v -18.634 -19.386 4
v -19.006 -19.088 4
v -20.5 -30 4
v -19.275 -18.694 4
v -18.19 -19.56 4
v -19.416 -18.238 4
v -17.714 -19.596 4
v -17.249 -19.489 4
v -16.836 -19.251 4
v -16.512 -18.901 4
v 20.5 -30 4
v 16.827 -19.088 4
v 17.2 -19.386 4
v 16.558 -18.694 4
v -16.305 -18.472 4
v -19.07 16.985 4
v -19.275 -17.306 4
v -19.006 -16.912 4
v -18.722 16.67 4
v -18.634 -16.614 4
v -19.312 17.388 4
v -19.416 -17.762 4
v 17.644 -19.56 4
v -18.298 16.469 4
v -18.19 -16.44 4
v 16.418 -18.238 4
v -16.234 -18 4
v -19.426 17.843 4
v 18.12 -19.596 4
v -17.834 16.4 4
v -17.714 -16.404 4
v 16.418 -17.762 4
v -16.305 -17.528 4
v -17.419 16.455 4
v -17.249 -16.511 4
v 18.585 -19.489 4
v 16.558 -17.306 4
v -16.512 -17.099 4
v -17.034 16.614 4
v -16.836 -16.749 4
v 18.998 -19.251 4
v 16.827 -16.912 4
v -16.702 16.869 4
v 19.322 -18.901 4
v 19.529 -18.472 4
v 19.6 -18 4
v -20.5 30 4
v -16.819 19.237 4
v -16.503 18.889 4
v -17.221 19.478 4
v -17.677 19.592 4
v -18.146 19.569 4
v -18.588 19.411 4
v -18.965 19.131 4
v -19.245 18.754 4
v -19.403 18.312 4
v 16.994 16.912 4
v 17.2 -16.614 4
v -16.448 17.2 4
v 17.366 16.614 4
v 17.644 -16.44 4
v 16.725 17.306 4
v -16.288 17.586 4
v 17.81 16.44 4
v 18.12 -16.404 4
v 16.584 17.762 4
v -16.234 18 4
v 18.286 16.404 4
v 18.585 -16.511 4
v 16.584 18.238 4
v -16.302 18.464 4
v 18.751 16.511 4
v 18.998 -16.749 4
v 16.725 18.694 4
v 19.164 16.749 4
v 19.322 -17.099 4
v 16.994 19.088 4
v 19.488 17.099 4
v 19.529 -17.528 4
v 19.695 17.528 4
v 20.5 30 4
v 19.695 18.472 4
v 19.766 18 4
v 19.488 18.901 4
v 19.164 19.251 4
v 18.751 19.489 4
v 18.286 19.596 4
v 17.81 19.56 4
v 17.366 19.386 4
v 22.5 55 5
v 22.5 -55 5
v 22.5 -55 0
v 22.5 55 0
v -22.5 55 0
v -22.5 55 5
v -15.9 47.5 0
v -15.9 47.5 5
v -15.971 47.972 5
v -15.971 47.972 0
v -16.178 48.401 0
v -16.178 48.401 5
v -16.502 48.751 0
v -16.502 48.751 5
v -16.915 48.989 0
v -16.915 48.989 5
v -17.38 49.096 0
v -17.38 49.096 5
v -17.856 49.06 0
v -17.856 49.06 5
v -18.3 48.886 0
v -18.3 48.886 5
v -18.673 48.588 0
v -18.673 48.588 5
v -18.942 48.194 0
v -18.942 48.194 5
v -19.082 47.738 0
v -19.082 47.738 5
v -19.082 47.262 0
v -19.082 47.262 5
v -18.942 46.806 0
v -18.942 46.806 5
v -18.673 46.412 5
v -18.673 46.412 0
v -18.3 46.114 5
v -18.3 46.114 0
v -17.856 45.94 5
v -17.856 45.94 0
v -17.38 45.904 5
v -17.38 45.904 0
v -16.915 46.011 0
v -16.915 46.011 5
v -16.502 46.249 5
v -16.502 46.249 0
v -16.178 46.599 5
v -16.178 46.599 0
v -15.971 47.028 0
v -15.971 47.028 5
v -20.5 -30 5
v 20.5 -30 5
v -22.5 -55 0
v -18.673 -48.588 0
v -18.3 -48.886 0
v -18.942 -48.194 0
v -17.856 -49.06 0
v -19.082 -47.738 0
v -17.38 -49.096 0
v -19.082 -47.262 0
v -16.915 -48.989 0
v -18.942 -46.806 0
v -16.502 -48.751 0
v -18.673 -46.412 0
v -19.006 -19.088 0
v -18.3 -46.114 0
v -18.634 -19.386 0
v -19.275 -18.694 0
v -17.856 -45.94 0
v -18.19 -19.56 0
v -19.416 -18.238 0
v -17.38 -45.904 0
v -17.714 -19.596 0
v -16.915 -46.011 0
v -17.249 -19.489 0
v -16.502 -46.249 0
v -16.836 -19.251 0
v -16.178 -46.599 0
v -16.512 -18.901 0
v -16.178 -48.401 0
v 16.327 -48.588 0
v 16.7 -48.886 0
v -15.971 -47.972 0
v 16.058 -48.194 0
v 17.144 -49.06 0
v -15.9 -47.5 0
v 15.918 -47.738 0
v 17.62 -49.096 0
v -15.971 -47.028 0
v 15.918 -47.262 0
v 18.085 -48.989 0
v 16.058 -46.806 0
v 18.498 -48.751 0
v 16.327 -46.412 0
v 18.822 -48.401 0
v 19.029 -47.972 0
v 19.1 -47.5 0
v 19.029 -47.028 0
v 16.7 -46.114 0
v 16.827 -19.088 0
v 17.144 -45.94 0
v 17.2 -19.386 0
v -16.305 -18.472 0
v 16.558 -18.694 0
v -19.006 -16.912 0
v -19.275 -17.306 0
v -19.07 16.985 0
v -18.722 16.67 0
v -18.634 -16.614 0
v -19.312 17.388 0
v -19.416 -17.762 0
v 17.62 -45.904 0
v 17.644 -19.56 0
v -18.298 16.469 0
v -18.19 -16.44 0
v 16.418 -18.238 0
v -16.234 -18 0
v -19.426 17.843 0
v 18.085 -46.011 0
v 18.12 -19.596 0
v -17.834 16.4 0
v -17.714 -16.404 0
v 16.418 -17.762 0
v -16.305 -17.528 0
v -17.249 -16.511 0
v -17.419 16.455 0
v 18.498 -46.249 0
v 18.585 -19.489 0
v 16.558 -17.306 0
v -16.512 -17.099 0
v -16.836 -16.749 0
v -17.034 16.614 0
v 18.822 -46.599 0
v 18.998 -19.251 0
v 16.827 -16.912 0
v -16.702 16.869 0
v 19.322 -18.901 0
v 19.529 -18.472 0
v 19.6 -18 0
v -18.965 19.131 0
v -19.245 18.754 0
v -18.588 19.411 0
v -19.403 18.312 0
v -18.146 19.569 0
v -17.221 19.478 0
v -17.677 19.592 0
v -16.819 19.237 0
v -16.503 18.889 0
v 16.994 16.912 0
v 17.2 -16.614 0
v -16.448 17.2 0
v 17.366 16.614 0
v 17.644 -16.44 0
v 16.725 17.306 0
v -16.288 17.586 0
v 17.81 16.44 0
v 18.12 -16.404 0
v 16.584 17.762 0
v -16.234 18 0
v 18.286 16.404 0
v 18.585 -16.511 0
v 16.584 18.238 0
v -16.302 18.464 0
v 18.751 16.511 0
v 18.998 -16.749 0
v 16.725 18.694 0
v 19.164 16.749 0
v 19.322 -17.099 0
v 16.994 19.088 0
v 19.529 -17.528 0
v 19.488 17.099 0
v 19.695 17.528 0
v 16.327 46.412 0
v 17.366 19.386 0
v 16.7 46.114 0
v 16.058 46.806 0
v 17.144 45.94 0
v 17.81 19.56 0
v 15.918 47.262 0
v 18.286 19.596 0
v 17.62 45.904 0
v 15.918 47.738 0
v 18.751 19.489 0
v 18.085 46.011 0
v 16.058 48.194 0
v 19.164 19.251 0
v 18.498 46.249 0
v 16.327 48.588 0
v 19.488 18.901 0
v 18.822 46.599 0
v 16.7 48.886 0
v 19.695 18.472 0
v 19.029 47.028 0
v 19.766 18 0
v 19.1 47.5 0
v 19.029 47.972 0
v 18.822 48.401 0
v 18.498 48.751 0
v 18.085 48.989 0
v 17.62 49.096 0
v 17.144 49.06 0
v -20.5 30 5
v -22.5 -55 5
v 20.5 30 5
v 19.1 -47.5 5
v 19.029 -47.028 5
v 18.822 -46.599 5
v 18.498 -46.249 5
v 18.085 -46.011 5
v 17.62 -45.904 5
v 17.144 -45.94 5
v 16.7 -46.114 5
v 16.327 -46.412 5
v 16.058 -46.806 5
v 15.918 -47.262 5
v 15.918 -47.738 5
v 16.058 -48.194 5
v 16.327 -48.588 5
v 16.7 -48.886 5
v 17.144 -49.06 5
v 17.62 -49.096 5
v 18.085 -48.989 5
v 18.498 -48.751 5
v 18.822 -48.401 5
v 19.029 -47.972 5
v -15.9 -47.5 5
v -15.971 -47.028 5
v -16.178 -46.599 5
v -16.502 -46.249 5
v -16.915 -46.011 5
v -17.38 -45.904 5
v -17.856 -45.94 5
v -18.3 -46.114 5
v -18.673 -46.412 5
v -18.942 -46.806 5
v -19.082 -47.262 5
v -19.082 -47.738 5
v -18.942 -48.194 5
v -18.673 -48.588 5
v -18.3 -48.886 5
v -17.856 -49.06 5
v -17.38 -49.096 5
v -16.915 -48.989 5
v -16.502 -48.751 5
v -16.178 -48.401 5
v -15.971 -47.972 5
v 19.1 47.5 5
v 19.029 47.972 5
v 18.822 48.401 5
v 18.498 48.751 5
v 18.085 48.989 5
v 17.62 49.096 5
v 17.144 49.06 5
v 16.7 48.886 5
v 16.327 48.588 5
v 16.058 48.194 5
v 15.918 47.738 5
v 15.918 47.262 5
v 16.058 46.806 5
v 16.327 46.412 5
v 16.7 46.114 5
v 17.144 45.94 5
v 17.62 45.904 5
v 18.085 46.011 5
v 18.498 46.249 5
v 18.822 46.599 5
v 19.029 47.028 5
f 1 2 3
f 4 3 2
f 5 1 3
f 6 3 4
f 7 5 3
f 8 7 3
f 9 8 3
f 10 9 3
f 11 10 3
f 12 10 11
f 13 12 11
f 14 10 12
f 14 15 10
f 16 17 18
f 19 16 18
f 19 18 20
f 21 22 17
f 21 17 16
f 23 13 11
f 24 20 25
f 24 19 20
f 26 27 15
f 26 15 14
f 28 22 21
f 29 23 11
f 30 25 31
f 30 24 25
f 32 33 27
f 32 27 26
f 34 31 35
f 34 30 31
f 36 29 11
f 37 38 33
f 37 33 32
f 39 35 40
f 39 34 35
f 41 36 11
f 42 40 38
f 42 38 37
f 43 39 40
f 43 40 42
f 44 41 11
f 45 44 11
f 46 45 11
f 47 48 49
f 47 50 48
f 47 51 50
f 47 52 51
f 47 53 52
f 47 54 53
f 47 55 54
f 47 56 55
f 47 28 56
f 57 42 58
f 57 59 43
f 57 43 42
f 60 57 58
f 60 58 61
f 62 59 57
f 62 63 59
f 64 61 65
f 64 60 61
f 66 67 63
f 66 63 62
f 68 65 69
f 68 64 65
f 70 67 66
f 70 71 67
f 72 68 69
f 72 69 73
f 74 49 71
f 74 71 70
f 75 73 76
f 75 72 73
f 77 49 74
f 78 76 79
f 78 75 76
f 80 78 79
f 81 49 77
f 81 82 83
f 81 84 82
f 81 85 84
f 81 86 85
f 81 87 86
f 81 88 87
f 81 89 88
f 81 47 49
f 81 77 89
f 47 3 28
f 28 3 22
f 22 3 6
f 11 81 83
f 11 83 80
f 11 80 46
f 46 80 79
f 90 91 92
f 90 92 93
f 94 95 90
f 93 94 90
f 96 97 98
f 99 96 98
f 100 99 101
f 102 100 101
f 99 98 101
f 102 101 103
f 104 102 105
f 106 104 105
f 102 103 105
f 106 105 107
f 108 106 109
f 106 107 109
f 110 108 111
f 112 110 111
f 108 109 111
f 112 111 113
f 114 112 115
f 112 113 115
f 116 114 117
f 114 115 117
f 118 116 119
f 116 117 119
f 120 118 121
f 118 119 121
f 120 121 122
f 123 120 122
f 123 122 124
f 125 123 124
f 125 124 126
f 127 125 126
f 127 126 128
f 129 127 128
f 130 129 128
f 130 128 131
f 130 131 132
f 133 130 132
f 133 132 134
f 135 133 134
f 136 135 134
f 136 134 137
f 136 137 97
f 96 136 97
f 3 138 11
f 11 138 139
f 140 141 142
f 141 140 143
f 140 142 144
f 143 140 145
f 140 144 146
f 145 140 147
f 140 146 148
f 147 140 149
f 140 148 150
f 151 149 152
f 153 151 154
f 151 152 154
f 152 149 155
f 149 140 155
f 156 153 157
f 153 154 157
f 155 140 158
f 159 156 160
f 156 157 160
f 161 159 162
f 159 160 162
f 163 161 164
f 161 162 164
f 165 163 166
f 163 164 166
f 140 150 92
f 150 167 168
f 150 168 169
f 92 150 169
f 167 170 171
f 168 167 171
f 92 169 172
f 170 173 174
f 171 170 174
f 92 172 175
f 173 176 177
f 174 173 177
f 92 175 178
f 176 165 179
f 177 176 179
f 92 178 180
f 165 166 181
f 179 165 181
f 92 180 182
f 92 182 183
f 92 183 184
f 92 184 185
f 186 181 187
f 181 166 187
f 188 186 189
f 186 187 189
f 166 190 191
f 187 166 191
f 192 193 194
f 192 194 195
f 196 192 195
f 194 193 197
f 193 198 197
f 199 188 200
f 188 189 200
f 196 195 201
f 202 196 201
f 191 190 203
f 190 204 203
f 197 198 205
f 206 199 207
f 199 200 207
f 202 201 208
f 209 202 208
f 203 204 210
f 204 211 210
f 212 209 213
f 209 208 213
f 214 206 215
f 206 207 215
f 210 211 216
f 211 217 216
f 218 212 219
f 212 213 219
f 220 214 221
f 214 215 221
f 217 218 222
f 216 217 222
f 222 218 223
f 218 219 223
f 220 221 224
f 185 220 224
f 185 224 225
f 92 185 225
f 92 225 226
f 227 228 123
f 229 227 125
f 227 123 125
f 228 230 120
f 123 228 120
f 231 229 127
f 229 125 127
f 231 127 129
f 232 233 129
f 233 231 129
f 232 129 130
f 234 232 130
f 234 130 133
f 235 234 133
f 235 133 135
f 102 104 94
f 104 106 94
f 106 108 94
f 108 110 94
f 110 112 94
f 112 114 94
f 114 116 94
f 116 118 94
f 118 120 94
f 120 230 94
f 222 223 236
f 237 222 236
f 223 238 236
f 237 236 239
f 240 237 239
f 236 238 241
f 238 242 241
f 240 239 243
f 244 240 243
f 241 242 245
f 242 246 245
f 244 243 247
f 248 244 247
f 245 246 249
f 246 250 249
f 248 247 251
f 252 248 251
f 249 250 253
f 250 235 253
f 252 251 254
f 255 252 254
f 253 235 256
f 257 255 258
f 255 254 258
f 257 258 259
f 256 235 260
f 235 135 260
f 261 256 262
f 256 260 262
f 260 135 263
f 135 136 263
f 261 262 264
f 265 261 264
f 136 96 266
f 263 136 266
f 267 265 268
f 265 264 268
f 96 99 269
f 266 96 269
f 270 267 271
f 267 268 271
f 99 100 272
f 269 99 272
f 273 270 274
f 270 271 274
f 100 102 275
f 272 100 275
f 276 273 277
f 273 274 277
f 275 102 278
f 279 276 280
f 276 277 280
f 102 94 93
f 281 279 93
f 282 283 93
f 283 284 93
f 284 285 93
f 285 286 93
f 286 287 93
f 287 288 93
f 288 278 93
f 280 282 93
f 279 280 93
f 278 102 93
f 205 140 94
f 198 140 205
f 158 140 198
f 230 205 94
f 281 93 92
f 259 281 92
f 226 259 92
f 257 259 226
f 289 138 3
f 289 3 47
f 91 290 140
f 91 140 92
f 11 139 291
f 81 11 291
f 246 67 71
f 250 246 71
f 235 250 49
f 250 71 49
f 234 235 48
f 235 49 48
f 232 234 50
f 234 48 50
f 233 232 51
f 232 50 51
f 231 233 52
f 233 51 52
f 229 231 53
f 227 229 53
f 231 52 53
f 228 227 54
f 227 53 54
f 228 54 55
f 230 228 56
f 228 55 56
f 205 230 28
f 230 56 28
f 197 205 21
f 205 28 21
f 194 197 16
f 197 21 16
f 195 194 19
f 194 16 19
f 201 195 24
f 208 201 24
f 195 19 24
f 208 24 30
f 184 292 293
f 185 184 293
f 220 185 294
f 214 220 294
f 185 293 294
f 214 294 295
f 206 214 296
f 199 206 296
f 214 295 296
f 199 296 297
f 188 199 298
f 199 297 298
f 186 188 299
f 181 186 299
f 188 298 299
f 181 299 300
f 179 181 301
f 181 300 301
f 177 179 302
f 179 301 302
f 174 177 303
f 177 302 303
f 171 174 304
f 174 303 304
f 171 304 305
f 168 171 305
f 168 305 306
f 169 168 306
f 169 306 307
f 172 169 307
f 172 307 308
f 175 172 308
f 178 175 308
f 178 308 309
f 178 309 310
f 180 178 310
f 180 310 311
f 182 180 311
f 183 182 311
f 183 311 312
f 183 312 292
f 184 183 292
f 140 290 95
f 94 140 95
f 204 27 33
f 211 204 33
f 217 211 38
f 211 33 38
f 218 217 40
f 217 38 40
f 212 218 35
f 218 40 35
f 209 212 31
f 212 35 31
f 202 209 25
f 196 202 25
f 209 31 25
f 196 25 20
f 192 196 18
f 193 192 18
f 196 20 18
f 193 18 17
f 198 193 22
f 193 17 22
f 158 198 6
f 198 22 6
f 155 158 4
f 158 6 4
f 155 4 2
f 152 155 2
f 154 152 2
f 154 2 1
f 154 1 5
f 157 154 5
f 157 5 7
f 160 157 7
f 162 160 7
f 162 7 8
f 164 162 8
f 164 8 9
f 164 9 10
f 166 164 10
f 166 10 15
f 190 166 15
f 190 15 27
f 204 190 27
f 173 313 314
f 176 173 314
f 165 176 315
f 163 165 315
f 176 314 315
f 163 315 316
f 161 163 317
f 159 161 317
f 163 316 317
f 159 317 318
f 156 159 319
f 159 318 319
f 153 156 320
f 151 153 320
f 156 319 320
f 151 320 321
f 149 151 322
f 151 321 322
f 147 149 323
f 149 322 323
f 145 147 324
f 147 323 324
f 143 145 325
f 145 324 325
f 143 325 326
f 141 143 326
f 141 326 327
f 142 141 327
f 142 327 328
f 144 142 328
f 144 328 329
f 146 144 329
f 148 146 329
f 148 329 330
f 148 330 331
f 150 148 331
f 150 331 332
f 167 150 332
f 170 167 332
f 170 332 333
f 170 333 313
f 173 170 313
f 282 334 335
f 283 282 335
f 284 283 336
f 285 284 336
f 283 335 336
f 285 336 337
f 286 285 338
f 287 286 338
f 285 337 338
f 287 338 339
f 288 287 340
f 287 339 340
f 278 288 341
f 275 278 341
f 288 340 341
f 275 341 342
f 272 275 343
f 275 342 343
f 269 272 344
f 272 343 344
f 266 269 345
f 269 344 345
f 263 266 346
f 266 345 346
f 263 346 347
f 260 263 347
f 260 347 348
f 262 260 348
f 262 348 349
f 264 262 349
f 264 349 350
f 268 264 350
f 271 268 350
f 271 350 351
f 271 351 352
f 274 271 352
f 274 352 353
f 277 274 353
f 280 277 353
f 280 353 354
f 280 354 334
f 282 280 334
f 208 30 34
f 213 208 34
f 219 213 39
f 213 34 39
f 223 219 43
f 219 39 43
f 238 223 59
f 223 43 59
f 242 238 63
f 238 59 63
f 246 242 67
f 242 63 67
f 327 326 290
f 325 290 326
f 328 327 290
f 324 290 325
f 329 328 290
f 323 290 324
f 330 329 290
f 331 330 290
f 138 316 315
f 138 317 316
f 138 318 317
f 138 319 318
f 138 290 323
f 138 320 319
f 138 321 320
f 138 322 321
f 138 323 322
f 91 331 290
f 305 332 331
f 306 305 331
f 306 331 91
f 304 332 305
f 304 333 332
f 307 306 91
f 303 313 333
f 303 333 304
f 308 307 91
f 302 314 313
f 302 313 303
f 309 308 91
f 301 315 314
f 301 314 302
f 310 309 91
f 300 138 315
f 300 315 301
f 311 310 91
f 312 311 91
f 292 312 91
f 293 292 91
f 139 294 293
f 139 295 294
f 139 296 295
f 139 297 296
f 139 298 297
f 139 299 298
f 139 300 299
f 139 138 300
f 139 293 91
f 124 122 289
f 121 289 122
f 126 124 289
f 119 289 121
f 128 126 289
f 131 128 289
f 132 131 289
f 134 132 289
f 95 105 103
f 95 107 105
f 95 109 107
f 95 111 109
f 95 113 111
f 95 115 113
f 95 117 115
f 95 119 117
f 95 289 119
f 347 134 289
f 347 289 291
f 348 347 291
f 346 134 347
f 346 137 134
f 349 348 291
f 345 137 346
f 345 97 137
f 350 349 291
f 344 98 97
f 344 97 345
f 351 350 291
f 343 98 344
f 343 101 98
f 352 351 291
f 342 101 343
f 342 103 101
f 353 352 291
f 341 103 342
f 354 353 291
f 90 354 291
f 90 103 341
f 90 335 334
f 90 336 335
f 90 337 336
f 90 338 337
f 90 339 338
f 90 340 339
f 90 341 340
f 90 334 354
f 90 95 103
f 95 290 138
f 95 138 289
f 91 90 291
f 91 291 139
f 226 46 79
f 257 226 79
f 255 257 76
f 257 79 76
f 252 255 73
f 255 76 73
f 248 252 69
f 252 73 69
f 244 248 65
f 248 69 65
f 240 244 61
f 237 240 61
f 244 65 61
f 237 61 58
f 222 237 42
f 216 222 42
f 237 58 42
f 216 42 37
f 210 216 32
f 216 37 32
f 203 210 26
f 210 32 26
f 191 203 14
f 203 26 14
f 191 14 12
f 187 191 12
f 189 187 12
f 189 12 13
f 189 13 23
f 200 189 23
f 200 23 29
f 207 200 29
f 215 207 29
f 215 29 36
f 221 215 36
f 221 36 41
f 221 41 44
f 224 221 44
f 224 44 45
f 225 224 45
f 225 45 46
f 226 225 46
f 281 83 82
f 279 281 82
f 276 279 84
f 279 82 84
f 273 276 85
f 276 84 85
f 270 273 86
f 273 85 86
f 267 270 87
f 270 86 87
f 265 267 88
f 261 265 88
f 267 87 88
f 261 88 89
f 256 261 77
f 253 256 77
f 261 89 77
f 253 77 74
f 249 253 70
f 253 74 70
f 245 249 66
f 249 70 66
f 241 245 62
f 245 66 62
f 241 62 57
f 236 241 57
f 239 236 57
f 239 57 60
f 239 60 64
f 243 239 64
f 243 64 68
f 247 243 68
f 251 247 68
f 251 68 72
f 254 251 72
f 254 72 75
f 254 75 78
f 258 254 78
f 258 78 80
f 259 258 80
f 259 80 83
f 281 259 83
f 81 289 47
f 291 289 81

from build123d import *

# Parameters (mm, degrees)
SKETCH_1_W          = 45
SKETCH_1_H          = 100
EXTRUDE_1_DEPTH     = 5
SKETCH_2_W          = 41
SKETCH_2_H          = 60
CUT_EXTRUDE_1_DEPTH = 1
SKETCH_5_W          = 45
SKETCH_5_H          = 5
EXTRUDE_2_DEPTH     = 5
SKETCH_4_R          = 1.6
CUT_EXTRUDE_4_DEPTH = 10
SKETCH_3_R          = 1.6
CUT_EXTRUDE_7_DEPTH = 10


with BuildPart() as part:
    # 草图1 → 凸台-拉伸1 (new body)
    with BuildSketch(Plane.XY):
        Rectangle(SKETCH_1_W, SKETCH_1_H)
    extrude(amount=EXTRUDE_1_DEPTH)

    # 草图2 → 切除-拉伸1 (cut)
    with BuildSketch(Plane.XY.offset(5)):
        Rectangle(SKETCH_2_W, SKETCH_2_H)
    extrude(amount=-CUT_EXTRUDE_1_DEPTH, mode=Mode.SUBTRACT)

    # 草图5 → 凸台-拉伸2 (add)
    with BuildSketch(Plane.XY.offset(5)):
        with Locations((0, 52.5)):
            Rectangle(SKETCH_5_W, SKETCH_5_H)
        with Locations((0, -52.5)):
            Rectangle(SKETCH_5_W, SKETCH_5_H)
    extrude(amount=-EXTRUDE_2_DEPTH)

    # 草图4 → 切除-拉伸4 (cut)
    with BuildSketch(Plane.XY.offset(5)):
        with Locations((-17.5, 47.5)):
            Circle(SKETCH_4_R)
        with Locations((17.5, 47.5)):
            Circle(SKETCH_4_R)
        with Locations((-17.5, -47.5)):
            Circle(SKETCH_4_R)
        with Locations((17.5, -47.5)):
            Circle(SKETCH_4_R)
    extrude(amount=-CUT_EXTRUDE_4_DEPTH, mode=Mode.SUBTRACT)

    # 草图3 → 切除-拉伸7 (cut)
    with BuildSketch(Plane.XY.offset(4)):
        with BuildLine():
            ThreePointArc((-17.833531825, 16.4), (-16.702160975, 16.86862915), (-16.233531825, 18))
            Line((-16.233531825, 18), (-17.833531825, 18))
            Line((-17.833531825, 18), (-17.833531825, 16.4))
        make_face()
        with BuildLine():
            Line((-17.833531825, 18), (-16.233531825, 18))
            ThreePointArc((-16.233531825, 18), (-18.964902675, 19.13137085), (-17.833531825, 16.4))
            Line((-17.833531825, 16.4), (-17.833531825, 18))
        make_face()
        with Locations((-17.833531825, -18)):
            Circle(SKETCH_3_R)
        with Locations((18, -18)):
            Circle(SKETCH_3_R)
        with Locations((18.166468175, 18)):
            Circle(SKETCH_3_R)
    extrude(amount=-CUT_EXTRUDE_7_DEPTH, mode=Mode.SUBTRACT)


solid = part.part
